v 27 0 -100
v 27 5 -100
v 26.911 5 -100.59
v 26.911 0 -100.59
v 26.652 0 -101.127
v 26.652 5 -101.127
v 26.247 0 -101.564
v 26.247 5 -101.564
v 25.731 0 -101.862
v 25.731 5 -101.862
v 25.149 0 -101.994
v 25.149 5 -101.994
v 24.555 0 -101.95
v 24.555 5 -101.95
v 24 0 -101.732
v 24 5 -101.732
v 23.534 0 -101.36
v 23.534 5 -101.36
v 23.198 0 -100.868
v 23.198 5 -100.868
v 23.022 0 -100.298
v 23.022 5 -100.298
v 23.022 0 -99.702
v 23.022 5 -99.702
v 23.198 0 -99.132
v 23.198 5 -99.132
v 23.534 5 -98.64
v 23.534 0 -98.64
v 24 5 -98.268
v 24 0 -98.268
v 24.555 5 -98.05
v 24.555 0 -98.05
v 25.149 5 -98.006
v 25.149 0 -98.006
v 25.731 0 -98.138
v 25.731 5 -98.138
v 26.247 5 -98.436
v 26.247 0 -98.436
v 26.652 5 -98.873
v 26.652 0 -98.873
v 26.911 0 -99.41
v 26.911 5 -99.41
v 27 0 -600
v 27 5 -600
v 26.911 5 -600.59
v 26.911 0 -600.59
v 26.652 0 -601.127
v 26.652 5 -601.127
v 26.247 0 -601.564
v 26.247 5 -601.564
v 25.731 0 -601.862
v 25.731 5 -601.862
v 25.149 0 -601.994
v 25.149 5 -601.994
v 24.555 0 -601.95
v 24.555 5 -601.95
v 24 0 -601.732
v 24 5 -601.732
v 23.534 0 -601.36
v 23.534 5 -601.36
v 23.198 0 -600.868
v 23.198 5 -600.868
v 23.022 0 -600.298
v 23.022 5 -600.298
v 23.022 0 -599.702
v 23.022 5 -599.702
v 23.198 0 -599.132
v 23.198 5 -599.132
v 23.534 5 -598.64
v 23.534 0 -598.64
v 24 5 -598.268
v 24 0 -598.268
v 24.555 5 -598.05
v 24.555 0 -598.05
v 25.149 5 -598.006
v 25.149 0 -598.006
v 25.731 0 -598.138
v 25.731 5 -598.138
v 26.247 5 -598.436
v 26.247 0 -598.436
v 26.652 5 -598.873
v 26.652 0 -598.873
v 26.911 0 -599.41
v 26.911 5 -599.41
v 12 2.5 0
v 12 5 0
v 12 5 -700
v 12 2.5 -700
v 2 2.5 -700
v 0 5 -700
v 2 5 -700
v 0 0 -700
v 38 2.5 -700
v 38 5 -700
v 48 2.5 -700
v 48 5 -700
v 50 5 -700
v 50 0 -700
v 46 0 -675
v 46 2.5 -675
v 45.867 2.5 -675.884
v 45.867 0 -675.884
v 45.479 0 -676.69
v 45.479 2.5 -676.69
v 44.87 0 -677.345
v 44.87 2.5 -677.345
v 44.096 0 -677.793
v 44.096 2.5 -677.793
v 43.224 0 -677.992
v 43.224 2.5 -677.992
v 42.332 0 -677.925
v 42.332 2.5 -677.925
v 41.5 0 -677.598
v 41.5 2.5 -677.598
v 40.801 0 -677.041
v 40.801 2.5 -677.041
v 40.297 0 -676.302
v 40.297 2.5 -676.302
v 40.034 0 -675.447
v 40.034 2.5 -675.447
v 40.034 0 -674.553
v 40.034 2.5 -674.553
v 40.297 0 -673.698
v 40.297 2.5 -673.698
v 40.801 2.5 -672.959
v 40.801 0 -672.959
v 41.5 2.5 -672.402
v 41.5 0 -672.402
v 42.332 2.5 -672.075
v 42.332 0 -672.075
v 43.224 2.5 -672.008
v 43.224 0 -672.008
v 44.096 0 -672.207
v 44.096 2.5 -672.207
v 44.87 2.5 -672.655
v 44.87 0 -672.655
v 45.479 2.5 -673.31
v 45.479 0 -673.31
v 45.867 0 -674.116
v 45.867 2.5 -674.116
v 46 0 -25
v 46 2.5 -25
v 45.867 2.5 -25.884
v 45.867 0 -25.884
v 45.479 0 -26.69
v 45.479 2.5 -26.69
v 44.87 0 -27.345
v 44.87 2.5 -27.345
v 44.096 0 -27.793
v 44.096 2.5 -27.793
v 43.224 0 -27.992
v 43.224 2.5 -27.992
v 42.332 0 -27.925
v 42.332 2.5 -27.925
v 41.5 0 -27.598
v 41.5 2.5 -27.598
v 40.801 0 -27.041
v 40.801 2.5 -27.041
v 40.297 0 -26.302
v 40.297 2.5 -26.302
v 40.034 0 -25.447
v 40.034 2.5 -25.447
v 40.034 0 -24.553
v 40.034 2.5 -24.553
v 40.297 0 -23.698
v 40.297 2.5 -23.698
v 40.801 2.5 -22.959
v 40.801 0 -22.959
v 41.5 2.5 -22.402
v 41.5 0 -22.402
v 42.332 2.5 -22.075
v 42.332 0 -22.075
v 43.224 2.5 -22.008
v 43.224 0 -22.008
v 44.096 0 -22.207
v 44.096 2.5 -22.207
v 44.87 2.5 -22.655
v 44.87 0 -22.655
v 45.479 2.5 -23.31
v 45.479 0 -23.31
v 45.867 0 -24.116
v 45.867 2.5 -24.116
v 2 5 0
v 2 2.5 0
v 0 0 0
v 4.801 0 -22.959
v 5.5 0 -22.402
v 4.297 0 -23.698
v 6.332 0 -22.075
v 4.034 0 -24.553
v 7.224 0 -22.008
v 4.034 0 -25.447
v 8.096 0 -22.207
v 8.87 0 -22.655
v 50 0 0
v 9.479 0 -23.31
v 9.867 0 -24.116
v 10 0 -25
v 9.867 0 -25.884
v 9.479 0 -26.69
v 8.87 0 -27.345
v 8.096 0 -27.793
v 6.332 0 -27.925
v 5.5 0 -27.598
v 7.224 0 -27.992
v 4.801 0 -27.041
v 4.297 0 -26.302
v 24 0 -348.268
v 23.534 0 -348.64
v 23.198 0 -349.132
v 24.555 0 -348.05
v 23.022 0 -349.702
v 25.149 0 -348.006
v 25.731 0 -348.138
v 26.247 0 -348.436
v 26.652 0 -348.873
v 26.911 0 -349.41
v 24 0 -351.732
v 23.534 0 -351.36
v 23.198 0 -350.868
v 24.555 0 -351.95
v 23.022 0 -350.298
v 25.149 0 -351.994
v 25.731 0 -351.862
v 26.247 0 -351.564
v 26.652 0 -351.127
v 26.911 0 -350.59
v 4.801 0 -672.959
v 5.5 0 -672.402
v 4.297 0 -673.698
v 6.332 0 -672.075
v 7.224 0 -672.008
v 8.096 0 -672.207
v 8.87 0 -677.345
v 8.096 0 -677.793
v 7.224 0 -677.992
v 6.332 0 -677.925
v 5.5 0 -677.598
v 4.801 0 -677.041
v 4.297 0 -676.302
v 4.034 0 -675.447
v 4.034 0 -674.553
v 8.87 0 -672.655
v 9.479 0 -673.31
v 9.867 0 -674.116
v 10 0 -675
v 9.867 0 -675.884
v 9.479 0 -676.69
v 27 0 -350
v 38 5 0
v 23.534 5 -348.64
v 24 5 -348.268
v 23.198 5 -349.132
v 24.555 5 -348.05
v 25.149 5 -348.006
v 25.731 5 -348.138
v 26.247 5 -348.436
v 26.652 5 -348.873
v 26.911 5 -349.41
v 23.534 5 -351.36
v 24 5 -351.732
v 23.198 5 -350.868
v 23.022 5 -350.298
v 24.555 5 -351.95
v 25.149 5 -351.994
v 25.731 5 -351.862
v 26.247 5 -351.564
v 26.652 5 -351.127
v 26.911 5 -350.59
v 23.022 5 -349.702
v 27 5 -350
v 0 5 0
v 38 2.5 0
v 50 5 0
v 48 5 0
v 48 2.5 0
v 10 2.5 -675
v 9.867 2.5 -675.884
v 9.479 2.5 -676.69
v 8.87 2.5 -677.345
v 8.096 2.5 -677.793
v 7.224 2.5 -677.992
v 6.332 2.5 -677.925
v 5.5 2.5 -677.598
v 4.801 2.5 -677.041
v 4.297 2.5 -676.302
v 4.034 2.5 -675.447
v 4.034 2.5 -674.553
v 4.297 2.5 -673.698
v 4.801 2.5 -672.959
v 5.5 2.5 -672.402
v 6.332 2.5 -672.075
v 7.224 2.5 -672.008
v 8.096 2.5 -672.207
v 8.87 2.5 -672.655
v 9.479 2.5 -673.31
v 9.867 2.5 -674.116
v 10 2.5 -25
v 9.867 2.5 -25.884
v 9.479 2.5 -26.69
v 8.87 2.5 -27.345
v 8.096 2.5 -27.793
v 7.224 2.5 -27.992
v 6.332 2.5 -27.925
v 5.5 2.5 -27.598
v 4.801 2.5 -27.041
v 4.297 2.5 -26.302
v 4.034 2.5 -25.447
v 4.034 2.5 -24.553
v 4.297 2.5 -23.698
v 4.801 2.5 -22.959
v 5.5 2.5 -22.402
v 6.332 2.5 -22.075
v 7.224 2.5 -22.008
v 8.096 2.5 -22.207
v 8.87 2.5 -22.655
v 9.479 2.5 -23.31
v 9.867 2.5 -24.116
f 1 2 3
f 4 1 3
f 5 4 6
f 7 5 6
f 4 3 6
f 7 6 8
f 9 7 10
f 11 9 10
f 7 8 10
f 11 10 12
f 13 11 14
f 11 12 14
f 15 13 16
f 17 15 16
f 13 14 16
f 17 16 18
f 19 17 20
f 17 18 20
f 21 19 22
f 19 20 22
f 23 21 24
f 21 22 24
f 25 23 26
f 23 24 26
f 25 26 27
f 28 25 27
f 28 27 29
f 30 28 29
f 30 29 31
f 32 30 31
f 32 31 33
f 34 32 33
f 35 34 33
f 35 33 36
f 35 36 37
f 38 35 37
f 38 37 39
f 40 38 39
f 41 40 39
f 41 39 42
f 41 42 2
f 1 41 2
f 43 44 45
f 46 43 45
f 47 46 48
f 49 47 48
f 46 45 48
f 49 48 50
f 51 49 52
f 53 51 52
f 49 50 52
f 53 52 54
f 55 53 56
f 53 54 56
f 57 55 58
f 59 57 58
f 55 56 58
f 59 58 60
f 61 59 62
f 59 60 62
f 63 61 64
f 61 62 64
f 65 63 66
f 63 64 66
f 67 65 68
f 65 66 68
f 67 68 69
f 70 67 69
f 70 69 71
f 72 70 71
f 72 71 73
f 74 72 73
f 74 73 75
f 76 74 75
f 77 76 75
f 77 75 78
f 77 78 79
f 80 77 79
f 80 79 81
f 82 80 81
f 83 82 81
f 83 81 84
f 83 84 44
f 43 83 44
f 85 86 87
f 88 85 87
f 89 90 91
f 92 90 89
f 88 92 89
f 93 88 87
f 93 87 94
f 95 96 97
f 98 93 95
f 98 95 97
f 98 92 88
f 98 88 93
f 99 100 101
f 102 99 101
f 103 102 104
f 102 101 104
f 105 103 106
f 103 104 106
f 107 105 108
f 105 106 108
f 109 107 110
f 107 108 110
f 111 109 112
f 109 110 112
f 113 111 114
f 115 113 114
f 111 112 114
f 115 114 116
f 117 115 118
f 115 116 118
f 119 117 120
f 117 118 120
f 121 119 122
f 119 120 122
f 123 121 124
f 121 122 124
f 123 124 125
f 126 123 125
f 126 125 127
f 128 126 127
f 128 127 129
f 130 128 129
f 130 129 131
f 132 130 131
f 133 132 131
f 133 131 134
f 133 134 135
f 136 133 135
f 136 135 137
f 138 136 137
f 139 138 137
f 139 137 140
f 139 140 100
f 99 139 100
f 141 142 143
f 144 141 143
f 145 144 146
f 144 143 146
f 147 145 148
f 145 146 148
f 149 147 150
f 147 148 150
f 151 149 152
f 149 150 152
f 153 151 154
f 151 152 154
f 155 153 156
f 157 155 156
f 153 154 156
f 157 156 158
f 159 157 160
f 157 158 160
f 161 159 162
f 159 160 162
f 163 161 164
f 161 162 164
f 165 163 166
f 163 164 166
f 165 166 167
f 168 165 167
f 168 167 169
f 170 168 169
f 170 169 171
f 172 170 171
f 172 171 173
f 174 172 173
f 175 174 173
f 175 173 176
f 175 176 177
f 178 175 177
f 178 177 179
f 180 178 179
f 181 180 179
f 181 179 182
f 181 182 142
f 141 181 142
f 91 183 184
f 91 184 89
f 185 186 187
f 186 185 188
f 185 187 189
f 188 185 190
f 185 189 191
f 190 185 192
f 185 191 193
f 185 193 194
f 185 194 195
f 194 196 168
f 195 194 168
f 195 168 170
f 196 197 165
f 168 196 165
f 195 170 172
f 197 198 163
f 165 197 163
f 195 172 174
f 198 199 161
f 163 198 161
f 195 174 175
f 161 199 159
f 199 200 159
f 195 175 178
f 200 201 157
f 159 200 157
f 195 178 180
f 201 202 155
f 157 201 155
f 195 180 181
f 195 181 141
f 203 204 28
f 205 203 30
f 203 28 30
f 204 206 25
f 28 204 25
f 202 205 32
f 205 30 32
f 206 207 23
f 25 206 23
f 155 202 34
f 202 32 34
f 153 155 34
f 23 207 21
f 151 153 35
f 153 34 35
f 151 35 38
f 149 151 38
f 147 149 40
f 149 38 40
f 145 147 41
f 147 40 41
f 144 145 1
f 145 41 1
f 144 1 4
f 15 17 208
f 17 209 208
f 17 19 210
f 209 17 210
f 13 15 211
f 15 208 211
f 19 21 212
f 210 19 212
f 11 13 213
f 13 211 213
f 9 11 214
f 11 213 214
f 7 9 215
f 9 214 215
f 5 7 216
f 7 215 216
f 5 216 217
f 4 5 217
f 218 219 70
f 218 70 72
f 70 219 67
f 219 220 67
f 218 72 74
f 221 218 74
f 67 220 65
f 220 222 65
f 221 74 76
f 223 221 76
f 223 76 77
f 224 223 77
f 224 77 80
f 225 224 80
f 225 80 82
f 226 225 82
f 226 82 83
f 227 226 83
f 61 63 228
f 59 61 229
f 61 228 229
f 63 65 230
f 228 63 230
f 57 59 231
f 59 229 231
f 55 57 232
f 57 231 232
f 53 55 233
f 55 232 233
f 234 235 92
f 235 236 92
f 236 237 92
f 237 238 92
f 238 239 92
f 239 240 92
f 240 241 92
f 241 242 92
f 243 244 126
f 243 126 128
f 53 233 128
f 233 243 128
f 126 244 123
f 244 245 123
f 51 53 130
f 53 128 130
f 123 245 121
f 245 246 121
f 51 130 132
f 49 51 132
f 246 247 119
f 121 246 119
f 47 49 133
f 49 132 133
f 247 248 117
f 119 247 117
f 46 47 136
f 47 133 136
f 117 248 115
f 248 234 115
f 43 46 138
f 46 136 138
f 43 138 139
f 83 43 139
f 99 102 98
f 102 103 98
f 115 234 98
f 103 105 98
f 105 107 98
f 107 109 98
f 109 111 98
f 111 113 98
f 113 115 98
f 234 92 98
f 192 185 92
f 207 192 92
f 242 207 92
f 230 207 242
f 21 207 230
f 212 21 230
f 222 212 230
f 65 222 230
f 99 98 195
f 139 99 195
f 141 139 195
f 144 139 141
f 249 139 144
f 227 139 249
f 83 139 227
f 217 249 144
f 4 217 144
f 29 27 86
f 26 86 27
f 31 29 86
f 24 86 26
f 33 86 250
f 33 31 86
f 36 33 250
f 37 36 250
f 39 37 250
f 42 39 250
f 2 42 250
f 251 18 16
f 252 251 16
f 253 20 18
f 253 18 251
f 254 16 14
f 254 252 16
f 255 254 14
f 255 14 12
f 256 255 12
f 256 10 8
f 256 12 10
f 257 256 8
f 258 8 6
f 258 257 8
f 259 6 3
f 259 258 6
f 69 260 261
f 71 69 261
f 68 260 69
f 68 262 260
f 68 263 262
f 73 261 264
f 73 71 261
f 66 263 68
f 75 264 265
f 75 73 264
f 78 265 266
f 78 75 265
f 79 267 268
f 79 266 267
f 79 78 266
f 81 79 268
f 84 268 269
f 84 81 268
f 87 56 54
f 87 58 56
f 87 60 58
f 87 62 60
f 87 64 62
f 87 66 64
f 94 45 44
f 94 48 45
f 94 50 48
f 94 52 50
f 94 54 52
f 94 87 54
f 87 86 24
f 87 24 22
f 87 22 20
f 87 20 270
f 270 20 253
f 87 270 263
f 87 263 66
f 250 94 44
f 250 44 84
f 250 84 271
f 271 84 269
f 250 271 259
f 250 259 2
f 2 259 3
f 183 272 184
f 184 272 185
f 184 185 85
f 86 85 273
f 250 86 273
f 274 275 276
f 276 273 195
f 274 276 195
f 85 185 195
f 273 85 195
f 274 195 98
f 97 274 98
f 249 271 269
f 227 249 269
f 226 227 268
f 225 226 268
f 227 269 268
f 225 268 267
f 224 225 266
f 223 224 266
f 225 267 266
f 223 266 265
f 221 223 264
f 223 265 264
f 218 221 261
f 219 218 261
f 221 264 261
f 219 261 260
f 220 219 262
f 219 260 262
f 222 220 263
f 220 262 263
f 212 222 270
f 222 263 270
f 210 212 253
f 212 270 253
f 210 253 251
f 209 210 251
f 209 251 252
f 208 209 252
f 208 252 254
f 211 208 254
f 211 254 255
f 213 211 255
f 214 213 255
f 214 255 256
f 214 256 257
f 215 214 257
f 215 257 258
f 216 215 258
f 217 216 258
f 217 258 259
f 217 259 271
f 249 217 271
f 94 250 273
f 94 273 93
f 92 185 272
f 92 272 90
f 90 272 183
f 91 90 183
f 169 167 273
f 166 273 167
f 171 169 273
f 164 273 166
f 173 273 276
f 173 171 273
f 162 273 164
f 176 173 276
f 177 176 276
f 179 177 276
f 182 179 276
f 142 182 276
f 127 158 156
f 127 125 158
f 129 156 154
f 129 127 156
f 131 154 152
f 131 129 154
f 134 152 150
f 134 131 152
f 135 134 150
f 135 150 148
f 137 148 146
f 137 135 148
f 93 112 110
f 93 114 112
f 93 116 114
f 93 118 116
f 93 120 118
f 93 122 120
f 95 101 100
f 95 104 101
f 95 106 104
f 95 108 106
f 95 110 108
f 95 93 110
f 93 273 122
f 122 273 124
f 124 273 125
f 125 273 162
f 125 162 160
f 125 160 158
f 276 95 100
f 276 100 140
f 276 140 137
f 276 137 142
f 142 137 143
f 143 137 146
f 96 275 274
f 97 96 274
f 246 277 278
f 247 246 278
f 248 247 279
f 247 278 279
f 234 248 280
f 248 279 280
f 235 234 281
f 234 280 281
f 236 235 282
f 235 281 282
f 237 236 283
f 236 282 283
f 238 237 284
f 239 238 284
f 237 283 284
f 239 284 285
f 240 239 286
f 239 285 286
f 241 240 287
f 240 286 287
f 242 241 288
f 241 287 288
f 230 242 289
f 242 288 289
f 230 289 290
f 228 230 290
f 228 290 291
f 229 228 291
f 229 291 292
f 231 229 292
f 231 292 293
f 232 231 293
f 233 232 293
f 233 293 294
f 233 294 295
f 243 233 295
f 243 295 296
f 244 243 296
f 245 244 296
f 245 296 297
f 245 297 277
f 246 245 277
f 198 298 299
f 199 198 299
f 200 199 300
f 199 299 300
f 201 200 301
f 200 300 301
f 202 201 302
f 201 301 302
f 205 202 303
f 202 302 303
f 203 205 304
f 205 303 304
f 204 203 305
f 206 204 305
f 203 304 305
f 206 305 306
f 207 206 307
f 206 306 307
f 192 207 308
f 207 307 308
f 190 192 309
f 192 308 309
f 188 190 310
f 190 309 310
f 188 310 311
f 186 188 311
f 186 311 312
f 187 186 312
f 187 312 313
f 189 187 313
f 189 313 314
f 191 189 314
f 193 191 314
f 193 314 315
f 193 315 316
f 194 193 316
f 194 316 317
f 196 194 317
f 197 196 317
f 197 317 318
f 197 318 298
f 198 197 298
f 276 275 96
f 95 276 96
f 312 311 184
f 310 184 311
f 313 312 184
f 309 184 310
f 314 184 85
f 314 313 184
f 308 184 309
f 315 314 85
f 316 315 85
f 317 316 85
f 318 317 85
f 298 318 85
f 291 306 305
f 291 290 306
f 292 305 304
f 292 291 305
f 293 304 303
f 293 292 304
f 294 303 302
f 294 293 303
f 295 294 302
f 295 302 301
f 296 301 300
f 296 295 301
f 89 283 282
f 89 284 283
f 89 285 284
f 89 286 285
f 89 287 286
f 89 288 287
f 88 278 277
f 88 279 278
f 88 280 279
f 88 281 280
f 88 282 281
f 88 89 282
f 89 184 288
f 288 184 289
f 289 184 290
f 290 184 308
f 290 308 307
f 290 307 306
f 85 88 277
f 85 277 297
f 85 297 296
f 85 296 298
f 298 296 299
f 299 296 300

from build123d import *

# Parameters (mm, degrees)
SKETCH1_W           = 50
SKETCH1_H           = 700
BOSS_EXTRUDE1_DEPTH = 5
SKETCH3_R           = 2
CUT_EXTRUDE1_DEPTH  = 6
SKETCH5_W           = 10
SKETCH5_H           = 700
CUT_EXTRUDE2_DEPTH  = 2.5
SKETCH6_R           = 3
CUT_EXTRUDE3_DEPTH  = 6


with BuildPart() as part:
    # Sketch1 → Boss-Extrude1 (new body)
    with BuildSketch(Plane(origin=(0, 0, 0), x_dir=(1, 0, 0), z_dir=(0, 1, 0))):
        with Locations((25, 350)):
            Rectangle(SKETCH1_W, SKETCH1_H)
    extrude(amount=BOSS_EXTRUDE1_DEPTH)

    # Sketch3 → Cut-Extrude1 (cut, through all)
    with BuildSketch(Plane(origin=(0, 5, 0), x_dir=(1, 0, 0), z_dir=(0, 1, 0))):
        with Locations((25, 600)):
            Circle(SKETCH3_R)
        with Locations((25, 350)):
            Circle(SKETCH3_R)
        with Locations((25, 100)):
            Circle(SKETCH3_R)
    extrude(amount=-CUT_EXTRUDE1_DEPTH, mode=Mode.SUBTRACT)

    # Sketch5 → Cut-Extrude2 (cut)
    with BuildSketch(Plane(origin=(0, 5, 0), x_dir=(1, 0, 0), z_dir=(0, 1, 0))):
        with Locations((7, 350)):
            Rectangle(SKETCH5_W, SKETCH5_H)
        with Locations((43, 350)):
            Rectangle(SKETCH5_W, SKETCH5_H)
    extrude(amount=-CUT_EXTRUDE2_DEPTH, mode=Mode.SUBTRACT)

    # Sketch6 → Cut-Extrude3 (cut, through all)
    with BuildSketch(Plane(origin=(0, 5, 0), x_dir=(1, 0, 0), z_dir=(0, 1, 0))):
        with Locations((43, 25)):
            Circle(SKETCH6_R)
        with Locations((7, 25)):
            Circle(SKETCH6_R)
        with Locations((43, 675)):
            Circle(SKETCH6_R)
        with Locations((7, 675)):
            Circle(SKETCH6_R)
    extrude(amount=-CUT_EXTRUDE3_DEPTH, mode=Mode.SUBTRACT)


solid = part.part
